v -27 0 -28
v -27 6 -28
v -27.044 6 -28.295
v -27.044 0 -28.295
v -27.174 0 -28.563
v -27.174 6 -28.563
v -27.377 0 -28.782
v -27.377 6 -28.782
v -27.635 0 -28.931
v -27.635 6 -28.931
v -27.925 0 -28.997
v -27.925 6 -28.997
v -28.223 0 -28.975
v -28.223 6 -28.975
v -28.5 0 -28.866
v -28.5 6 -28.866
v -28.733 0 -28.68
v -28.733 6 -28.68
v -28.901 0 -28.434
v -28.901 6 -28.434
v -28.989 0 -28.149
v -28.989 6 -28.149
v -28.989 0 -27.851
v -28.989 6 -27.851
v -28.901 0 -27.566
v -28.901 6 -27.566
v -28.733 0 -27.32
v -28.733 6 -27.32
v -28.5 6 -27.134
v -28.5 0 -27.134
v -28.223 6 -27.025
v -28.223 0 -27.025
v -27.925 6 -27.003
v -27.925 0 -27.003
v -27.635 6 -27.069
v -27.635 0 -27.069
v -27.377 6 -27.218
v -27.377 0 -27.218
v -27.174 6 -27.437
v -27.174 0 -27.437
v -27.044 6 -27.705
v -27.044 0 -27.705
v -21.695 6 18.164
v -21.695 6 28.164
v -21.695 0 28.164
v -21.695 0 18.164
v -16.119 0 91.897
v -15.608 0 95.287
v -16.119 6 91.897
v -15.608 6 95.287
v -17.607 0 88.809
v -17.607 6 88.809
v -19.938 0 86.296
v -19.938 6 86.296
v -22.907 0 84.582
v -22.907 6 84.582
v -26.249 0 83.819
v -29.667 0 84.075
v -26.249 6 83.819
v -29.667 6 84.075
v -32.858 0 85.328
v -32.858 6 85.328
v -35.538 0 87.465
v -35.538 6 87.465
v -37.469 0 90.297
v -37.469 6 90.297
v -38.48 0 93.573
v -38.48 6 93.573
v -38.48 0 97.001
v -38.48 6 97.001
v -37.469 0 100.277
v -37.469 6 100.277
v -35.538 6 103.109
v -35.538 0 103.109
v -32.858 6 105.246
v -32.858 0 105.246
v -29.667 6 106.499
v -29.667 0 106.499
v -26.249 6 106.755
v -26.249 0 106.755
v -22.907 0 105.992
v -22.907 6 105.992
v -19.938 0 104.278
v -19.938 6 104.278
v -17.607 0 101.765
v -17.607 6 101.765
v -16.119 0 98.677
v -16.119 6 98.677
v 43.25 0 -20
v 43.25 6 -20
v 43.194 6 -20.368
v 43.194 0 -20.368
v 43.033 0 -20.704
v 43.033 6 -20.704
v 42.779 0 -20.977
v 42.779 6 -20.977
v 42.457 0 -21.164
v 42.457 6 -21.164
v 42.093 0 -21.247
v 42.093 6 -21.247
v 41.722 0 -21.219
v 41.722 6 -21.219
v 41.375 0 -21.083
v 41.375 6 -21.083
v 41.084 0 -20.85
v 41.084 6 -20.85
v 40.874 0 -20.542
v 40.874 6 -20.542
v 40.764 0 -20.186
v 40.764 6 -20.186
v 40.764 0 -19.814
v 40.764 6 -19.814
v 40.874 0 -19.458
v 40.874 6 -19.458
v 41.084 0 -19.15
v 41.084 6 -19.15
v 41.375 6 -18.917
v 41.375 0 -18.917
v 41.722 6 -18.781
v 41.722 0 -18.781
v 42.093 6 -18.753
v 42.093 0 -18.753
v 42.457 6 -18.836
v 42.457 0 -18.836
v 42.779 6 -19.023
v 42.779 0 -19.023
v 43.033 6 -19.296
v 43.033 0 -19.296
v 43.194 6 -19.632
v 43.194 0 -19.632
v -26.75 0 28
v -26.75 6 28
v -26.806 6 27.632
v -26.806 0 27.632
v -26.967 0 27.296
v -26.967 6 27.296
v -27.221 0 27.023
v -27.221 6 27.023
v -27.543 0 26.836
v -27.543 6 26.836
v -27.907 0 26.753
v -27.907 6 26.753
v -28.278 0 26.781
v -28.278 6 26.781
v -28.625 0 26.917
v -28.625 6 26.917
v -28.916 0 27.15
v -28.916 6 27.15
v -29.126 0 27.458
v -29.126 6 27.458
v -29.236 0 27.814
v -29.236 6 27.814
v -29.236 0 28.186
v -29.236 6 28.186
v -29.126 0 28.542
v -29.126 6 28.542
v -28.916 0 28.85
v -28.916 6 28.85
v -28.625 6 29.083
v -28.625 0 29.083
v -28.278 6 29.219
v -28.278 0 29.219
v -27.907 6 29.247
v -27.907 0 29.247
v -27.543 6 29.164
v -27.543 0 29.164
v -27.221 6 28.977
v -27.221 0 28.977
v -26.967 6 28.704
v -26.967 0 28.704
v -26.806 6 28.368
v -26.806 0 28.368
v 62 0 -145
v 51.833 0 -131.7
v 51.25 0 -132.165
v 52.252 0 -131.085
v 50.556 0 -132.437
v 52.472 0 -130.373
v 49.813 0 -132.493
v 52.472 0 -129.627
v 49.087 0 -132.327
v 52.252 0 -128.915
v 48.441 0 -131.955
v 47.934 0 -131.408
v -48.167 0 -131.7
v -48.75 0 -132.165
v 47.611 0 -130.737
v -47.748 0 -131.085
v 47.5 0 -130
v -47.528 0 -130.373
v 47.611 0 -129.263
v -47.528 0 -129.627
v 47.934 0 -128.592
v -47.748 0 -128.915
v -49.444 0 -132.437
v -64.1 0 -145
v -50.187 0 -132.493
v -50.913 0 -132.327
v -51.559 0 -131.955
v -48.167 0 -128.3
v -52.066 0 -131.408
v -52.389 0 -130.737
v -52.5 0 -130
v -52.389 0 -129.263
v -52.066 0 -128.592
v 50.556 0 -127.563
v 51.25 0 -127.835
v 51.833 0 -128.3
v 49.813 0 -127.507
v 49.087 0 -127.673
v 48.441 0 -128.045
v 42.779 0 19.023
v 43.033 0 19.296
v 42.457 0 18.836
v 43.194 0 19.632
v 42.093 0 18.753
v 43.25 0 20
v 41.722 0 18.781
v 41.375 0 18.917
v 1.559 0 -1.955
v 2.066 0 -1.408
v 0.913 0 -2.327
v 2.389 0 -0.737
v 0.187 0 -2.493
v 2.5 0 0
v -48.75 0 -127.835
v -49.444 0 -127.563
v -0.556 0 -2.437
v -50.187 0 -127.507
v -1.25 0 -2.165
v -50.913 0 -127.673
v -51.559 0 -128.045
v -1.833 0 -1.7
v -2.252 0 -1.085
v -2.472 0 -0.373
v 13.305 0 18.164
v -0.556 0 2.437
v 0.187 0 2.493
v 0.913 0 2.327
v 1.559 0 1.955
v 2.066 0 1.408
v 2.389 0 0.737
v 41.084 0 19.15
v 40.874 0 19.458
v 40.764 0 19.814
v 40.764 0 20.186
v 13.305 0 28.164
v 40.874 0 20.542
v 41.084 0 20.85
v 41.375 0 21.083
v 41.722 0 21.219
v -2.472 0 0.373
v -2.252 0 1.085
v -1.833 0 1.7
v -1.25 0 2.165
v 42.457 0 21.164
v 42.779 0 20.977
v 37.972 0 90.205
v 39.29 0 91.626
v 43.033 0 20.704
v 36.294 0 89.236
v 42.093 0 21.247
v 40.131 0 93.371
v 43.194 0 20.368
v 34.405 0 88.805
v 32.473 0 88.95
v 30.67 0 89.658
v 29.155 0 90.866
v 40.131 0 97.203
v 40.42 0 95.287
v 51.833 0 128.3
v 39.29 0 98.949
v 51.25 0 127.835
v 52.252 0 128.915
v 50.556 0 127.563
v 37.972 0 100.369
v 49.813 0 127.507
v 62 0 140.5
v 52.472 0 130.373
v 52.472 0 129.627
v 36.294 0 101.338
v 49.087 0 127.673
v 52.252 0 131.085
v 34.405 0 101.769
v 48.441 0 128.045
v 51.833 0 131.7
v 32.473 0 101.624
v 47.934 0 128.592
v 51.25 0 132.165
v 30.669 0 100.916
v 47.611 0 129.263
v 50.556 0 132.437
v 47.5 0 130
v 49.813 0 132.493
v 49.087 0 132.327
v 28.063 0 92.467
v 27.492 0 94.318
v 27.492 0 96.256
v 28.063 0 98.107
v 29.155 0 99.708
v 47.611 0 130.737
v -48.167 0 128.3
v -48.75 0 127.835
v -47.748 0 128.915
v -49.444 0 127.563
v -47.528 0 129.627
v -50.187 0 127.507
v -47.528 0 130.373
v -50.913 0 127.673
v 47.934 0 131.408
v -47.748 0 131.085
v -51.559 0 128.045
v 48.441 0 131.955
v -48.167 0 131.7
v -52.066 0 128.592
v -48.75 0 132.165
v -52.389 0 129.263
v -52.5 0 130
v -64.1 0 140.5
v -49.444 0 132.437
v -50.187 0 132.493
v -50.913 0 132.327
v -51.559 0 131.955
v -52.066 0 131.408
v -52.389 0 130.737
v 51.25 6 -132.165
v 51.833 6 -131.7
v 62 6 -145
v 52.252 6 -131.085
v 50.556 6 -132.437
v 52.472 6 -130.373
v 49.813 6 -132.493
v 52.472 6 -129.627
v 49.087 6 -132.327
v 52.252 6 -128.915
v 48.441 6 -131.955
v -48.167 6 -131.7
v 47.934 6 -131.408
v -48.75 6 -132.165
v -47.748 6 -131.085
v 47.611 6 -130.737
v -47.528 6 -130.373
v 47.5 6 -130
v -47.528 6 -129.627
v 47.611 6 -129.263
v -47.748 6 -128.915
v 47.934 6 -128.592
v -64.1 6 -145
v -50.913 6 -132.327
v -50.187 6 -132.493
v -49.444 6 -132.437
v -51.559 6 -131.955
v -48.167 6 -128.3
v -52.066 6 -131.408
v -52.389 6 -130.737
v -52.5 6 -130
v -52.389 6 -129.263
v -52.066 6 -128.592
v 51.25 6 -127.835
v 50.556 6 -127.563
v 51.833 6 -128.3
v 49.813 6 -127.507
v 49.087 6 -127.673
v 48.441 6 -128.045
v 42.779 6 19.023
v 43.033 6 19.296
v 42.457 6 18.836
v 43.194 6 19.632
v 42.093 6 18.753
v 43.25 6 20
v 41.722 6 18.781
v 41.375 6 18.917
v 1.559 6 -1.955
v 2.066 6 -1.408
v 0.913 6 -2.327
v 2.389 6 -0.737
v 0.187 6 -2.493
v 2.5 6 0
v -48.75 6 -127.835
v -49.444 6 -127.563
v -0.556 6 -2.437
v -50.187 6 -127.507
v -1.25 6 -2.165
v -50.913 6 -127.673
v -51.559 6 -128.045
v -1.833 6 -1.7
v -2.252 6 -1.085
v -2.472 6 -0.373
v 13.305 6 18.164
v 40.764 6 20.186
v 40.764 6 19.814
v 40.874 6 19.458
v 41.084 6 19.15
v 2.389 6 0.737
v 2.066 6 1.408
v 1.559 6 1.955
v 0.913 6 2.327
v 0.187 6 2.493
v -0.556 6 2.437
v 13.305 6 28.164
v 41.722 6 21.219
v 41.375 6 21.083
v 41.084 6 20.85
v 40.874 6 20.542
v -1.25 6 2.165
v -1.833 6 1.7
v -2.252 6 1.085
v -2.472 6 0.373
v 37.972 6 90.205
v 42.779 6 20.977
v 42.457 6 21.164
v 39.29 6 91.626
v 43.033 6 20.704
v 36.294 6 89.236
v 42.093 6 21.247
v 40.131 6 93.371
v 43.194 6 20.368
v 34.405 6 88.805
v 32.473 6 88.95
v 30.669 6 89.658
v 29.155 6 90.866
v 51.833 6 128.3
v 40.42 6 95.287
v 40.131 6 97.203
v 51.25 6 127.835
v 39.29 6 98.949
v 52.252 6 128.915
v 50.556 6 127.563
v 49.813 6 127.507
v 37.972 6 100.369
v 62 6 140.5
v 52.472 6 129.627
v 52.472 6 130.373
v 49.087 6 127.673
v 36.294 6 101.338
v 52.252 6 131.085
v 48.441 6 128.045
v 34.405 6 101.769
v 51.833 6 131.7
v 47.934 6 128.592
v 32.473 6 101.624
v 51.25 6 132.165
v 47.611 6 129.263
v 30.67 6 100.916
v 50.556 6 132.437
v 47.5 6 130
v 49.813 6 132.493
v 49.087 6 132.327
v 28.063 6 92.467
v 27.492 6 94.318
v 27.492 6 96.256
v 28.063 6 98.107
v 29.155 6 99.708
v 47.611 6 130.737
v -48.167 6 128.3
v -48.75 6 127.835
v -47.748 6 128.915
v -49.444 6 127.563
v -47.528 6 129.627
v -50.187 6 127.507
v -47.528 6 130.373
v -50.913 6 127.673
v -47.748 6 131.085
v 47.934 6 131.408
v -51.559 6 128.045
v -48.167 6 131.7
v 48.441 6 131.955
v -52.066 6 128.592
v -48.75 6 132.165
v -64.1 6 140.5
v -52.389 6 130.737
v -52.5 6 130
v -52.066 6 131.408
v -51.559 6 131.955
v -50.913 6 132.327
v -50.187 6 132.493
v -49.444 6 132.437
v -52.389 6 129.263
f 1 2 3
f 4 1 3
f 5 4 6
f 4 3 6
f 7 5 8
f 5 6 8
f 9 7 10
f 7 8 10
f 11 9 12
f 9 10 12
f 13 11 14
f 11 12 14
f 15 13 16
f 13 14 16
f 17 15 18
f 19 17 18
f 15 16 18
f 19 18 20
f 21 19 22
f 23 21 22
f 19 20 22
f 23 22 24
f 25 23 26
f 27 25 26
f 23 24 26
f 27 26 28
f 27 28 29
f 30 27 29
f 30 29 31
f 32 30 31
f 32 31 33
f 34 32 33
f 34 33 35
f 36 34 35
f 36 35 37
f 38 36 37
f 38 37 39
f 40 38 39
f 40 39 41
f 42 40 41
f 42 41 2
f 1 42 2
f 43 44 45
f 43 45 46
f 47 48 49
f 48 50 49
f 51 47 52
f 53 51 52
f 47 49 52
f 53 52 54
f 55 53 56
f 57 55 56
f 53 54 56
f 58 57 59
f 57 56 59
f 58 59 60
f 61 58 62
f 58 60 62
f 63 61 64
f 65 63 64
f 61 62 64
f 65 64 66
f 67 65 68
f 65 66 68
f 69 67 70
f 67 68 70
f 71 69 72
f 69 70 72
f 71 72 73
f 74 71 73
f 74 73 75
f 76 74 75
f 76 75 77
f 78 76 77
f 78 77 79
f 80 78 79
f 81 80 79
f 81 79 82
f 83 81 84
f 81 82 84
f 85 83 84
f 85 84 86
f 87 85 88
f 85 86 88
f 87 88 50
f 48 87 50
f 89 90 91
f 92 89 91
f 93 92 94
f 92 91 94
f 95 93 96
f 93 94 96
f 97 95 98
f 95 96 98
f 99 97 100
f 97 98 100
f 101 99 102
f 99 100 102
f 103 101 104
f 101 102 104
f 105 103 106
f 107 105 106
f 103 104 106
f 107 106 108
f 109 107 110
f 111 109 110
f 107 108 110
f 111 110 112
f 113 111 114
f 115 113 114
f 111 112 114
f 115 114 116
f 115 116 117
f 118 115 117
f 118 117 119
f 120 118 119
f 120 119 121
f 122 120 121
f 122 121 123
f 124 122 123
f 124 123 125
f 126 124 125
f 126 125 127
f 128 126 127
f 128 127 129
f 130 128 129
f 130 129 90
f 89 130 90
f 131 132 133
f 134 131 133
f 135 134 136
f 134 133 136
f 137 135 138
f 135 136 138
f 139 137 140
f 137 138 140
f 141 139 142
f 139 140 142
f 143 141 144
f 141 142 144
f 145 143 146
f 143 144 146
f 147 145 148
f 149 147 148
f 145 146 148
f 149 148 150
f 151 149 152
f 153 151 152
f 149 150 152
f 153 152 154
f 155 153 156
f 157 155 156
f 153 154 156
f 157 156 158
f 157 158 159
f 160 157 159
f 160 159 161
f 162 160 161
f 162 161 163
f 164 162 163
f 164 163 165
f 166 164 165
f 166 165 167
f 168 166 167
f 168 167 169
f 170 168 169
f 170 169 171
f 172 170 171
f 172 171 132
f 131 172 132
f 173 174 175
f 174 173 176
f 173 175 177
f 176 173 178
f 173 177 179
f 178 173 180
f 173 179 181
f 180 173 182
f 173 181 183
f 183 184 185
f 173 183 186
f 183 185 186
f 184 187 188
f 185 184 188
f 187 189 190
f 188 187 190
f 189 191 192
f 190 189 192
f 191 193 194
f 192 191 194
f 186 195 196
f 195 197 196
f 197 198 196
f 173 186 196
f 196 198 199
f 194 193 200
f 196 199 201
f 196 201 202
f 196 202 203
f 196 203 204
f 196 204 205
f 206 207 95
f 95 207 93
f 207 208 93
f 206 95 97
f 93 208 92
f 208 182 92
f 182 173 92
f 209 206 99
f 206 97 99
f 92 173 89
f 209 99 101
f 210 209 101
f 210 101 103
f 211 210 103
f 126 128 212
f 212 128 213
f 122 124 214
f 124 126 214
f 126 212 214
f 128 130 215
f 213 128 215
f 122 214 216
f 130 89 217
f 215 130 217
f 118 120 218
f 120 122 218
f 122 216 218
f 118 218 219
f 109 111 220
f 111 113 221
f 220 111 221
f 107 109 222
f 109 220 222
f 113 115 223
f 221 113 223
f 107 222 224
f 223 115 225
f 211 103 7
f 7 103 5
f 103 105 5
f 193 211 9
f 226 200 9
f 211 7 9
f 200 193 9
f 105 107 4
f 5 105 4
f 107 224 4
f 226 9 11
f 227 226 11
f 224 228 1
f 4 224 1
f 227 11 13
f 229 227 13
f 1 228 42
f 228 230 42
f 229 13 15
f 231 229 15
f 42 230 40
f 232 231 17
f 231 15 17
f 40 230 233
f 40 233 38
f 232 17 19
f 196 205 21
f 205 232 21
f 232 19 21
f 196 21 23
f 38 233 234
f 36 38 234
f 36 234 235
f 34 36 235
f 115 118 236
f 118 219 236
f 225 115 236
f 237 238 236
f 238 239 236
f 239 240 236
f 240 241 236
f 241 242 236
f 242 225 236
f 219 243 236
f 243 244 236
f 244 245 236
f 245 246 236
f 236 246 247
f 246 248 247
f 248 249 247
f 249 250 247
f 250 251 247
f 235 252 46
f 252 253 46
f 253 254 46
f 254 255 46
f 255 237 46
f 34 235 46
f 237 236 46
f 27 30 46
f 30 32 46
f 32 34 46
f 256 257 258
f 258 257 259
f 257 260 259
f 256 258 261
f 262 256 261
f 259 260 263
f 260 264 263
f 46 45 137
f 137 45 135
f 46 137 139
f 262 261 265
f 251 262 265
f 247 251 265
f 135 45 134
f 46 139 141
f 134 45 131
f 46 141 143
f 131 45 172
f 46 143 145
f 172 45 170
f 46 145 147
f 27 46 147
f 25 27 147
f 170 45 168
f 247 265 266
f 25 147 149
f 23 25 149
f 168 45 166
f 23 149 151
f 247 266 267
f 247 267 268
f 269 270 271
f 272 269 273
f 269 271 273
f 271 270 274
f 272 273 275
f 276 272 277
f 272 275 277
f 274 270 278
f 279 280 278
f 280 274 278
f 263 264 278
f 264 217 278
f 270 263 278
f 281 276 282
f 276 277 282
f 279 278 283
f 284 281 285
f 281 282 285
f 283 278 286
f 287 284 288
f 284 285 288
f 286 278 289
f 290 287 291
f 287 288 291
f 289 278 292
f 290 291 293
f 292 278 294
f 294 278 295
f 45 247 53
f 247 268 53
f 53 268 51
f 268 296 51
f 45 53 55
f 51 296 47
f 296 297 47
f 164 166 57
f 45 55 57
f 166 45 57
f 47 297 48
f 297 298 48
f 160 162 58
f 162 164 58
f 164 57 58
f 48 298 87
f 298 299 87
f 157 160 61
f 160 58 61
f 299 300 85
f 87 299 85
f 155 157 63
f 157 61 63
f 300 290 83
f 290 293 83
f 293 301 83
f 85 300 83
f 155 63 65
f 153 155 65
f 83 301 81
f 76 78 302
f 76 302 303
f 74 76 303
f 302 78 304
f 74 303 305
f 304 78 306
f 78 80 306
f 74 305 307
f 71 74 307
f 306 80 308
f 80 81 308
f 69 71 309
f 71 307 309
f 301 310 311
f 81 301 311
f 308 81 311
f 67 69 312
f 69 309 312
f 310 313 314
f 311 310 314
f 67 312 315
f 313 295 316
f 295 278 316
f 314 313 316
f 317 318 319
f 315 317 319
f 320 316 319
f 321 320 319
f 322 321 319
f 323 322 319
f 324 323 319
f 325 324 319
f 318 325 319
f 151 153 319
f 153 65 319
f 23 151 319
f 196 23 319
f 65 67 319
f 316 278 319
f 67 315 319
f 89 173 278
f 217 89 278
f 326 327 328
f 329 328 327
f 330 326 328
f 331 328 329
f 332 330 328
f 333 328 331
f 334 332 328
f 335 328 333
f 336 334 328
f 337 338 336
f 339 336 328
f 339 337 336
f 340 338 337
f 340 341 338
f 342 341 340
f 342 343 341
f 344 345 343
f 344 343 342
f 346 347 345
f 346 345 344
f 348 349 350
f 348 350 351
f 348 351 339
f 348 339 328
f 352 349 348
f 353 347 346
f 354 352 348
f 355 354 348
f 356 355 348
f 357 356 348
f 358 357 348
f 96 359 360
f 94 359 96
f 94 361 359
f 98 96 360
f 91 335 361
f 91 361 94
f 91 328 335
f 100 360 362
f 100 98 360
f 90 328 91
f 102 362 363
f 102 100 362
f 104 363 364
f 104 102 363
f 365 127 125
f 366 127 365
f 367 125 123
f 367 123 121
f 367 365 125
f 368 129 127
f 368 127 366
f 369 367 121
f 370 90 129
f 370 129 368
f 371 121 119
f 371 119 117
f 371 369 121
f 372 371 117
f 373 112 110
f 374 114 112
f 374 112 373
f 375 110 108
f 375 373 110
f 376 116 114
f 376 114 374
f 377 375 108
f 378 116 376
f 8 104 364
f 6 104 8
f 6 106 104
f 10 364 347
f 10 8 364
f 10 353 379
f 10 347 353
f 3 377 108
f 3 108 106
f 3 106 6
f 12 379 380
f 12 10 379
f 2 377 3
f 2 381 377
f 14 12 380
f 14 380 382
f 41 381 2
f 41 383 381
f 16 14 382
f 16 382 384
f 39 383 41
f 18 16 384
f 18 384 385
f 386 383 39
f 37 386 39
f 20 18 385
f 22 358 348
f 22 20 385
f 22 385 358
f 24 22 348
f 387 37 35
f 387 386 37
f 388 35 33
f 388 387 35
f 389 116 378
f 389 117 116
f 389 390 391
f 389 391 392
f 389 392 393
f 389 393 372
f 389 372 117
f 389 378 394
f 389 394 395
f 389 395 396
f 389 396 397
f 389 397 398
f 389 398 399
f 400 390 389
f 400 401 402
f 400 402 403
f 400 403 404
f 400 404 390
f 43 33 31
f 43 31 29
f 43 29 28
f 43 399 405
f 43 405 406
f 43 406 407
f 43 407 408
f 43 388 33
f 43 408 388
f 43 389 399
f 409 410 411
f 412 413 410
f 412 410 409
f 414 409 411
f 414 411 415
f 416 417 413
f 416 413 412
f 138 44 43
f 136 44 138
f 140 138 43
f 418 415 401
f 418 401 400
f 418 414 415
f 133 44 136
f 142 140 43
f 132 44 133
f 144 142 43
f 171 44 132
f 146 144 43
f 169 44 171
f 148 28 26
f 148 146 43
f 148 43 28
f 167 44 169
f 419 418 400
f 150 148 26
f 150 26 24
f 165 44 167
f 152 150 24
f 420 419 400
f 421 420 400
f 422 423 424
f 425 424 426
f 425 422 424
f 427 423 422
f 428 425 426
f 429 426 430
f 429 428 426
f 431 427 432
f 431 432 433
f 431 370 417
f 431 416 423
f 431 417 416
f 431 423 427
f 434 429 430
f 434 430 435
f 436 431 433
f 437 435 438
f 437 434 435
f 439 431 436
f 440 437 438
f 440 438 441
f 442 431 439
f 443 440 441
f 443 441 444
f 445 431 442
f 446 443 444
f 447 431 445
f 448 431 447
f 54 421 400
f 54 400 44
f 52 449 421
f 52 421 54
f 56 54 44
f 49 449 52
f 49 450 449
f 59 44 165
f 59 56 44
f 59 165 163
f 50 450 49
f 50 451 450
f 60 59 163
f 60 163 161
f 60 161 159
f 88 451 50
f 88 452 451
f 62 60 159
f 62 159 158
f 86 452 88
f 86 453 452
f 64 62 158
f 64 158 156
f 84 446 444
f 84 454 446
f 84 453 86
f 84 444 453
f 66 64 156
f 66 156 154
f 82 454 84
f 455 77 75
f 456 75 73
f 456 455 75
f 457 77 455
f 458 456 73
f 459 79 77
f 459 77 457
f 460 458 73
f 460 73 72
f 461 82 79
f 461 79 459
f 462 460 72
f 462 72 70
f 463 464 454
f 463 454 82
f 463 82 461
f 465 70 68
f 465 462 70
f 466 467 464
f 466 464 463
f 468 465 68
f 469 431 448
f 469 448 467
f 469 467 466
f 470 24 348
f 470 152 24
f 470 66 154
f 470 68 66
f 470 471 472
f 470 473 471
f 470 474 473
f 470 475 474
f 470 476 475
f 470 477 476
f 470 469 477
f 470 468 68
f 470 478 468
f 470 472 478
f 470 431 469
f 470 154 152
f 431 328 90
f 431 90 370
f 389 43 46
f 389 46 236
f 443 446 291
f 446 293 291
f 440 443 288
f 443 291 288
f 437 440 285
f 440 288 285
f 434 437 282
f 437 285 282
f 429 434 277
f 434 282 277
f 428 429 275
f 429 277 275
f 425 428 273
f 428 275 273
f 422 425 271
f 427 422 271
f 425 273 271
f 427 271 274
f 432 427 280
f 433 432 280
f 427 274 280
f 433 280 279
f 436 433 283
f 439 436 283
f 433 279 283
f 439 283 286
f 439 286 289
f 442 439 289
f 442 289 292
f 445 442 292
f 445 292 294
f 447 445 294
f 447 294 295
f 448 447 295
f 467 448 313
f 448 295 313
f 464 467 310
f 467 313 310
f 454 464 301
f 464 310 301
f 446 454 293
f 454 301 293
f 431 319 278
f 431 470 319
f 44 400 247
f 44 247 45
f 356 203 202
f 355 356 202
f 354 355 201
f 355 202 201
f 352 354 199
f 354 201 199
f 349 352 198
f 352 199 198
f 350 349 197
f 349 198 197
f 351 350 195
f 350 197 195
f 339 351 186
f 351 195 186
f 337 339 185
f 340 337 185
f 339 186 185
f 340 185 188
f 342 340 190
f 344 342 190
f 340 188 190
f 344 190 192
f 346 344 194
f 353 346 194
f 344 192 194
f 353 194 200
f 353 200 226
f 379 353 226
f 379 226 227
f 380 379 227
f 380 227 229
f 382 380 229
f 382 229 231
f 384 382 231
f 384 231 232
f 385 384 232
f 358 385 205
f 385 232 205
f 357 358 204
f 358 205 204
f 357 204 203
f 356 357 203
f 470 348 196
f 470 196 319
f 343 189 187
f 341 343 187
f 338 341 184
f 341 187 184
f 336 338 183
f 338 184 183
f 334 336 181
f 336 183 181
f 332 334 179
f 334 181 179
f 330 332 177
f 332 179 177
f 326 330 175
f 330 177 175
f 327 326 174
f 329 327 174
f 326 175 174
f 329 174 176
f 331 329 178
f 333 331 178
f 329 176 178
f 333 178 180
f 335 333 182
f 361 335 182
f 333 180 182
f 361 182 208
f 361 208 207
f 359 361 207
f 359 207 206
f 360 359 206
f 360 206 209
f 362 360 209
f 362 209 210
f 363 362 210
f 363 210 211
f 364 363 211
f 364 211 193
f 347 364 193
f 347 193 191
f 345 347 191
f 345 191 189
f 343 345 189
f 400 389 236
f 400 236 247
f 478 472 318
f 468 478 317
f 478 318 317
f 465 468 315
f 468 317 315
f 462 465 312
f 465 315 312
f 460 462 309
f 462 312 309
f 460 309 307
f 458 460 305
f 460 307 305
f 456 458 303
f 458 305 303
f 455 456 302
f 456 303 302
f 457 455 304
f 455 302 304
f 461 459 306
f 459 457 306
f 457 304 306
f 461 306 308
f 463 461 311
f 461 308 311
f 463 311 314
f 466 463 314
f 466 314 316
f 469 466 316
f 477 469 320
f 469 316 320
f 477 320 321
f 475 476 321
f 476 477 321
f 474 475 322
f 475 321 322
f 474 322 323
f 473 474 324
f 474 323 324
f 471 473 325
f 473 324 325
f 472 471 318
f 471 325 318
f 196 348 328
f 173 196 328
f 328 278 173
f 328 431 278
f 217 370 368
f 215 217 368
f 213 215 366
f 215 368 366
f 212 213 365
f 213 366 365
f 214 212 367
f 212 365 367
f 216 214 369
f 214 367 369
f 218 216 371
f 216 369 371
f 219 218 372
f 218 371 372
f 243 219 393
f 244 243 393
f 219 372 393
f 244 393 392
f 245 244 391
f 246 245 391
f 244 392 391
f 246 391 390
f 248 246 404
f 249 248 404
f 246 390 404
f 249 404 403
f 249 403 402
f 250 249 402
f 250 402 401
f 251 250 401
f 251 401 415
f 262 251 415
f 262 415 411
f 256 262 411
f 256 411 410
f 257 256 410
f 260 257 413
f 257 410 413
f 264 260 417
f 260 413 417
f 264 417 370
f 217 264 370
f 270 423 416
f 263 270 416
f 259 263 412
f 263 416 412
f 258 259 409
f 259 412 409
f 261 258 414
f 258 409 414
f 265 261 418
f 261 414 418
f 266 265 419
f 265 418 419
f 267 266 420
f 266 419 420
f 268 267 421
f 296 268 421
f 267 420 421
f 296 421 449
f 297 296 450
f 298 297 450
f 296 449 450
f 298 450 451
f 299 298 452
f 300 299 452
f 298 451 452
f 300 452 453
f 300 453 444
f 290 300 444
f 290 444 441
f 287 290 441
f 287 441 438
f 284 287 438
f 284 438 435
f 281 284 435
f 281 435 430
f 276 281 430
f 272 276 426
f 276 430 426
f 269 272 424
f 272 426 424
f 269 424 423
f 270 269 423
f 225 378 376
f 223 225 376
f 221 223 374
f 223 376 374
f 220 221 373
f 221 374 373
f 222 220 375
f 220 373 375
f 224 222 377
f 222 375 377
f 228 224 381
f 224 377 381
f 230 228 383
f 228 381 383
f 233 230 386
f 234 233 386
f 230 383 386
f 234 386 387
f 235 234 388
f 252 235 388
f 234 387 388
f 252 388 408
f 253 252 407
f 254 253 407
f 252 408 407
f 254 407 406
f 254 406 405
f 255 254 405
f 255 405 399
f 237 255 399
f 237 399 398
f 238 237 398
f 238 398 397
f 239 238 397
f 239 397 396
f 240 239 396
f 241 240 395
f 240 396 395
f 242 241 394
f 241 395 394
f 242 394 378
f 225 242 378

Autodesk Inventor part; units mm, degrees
ref_plane "YZ Plane" through (0, 0, 0) normal (1, 0, 0) x (0, 1, 0)
ref_plane "XZ Plane" through (0, 0, 0) normal (0, 1, 0) x (-1, 0, 0)
ref_plane "XY Plane" through (0, 0, 0) normal (0, 0, 1) x (1, 0, 0)
sketch "Sketch1" plane through (0, 0, 0) normal (0, 1, 0) x (-1, 0, 0)
  line L0 (50, 130) -> (-50, 130)
  line L1 (-50, 130) -> (-50, -130)
  line L2 (-50, -130) -> (50, -130)
  line L3 (50, -130) -> (50, 130)
  line L4 (50, 130) -> (-50, -130) construction
  line L5 (-50, 130) -> (50, -130) construction
  line L6 (57.5, 137.5) -> (-57.5, 137.5)
  line L7 (-57.5, 137.5) -> (-57.5, -137.5)
  line L8 (-57.5, -137.5) -> (57.5, -137.5)
  line L9 (57.5, -137.5) -> (57.5, 137.5)
  line L10 (57.5, 137.5) -> (-57.5, -137.5) construction
  line L11 (-57.5, 137.5) -> (57.5, -137.5) construction
  circle A0 centre (50, 130) radius 2.5
  circle A1 centre (-50, 130) radius 2.5
  circle A2 centre (-50, -130) radius 2.5
  circle A3 centre (50, -130) radius 2.5
  point P0 (0, 0)
  dimension "d0" = 100
  dimension "d1" = 260
  dimension "d2" = 115
  dimension "d3" = 275
  dimension "d4" = 5
  dimension "d5" = 5
  dimension "d6" = 5
  dimension "d7" = 5
extrude "Extrusion1" add sketch "Sketch1" along normal blind 6 contours L0 A0 L3 A3 L2 A2 L1 A1 | L9 L8 L7 L6
sketch "Sketch2" plane through (0, 6, 0) normal (0, 1, 0) x (1, 0, 0)
  circle A0 centre (0, 0) radius 2.5
  line L0 (0, 0) -> (42, 0)
  line L1 (42, 0) -> (0, 0)
  line L2 (0, 0) -> (-28, 0)
  line L3 (-28, 0) -> (-28, 28)
  line L4 (-28, 28) -> (-28, -28)
  line L5 (42, 0) -> (42, 20)
  line L6 (42, 20) -> (42, -20)
  circle A1 centre (-28, -28) radius 1.25
  circle A2 centre (-28, 28) radius 1
  circle A3 centre (42, 20) radius 1.25
  circle A4 centre (42, -20) radius 1.25
  line L7 (-21.6952, -23.1643) -> (-21.6952, -28.1643)
  line L8 (-21.6952, -28.1643) -> (-21.6952, -23.1643)
  line L9 (-21.6952, -23.1643) -> (-21.6952, -18.1643)
  line L10 (-21.6952, -18.1643) -> (13.3048, -18.1643)
  line L11 (13.3048, -18.1643) -> (13.3048, -28.1643)
  line L12 (13.3048, -28.1643) -> (-21.6952, -28.1643)
  dimension "d10" = 5
  dimension "d11" = 42
  dimension "d12" = 42
  dimension "d13" = 28
  dimension "d14" = 28
  dimension "d15" = 56
  dimension "d16" = 20
  dimension "d17" = 40
  dimension "d18" = 2.5
  dimension "d19" = 2
  dimension "d20" = 2.5
  dimension "d21" = 2.5
  dimension "d22" = 5
  dimension "d23" = 5
  dimension "d24" = 5
  dimension "d25" = 35
extrude "Extrusion2" cut sketch "Sketch2" against normal blind 6
sketch "Sketch3" plane through (0, 6, 0) normal (0, 1, 0) x (1, 0, 0)
  point P0 (0, 0)
sketch "Sketch4" plane through (0, 6, 0) normal (0, 1, 0) x (1, 0, 0)
  line L0 (-57.5, 137.5) -> (-57.5, -137.5) projected
  line L1 (-57.5, -137.5) -> (-57.5, 0)
  line L2 (-21.6952, -18.1643) -> (-21.6952, -28.1643) projected
  line L3 (-21.6952, -28.1643) -> (-75.3295, -28.1643)
  line L4 (-75.3295, -28.1643) -> (-57.5, -28.1643)
  line L5 (-57.5, -137.5) -> (-57.5, -28.1643)
  line L6 (-57.5, -28.1643) -> (-57.5, -82.8322)
  line L7 (-57.5, -82.8322) -> (-27.1083, -82.8322)
  line L8 (-27.1083, -82.8322) -> (0, -82.8322)
  line L9 (0, -82.8322) -> (72.7953, -82.8322)
  line L10 (72.7953, -82.8322) -> (0, -82.8322)
  line L11 (0, -95.2871) -> (0, -82.8322)
  line L12 (0, -95.2871) -> (-27.1083, -95.2871)
  line L13 (-27.1083, -95.2871) -> (0, -95.2871)
  line L14 (33.9195, -95.2871) -> (0, -95.2871)
  circle A0 centre (-27.1083, -95.2871) radius 11.5
  circle A1 centre (33.9195, -95.2871) radius 6.5
  point P0 (0, 0)
  dimension "d28" = 23
  dimension "d29" = 13
extrude "Extrusion3" cut sketch "Sketch4" against normal blind 10
sketch "Sketch5" plane through (0, 6, 0) normal (0, 1, 0) x (1, 0, 0)
  line L0 (-57.5, -137.5) -> (57.5, -137.5) projected
  line L1 (-57.5, -137.5) -> (-64.1, -137.5)
  line L2 (57.5, 137.5) -> (-57.5, 137.5) projected
  line L3 (-57.5, 137.5) -> (-64.1, 137.5)
  line L4 (-64.1, 137.5) -> (-64.1, -137.5)
  line L5 (-64.1, 137.5) -> (-64.1, 145)
  line L6 (-64.1, 145) -> (57.5, 145)
  line L7 (57.5, 145) -> (57.5, 137.5)
  line L8 (57.5, 145) -> (62, 145)
  line L9 (62, 145) -> (62, -137.5)
  line L10 (57.5, -137.5) -> (57.5, 137.5) projected
  line L11 (62, -137.5) -> (57.5, -137.5)
  line L12 (-64.1, -137.5) -> (-64.1, -140.5)
  line L13 (-64.1, -140.5) -> (62, -140.5)
  line L14 (62, -140.5) -> (62, -137.5)
  line L15 (-57.5, -137.5) -> (-57.5, 137.5)
  line L16 (57.5, 137.5) -> (57.5, -137.5)
  point P0 (0, 0)
  dimension "d32" = 6.6
  dimension "d33" = 6.6
  dimension "d34" = 7.5
  dimension "d35" = 4.5
  dimension "d36" = 3
extrude "Extrusion4" add sketch "Sketch5" against normal blind 6 contours L0 L11 L14 L13 L12 L1 | L1 L4 L3 L15 | L10 L7 L8 L9 L11 | L3 L5 L6 L7 L2
properties part number "platform_plate" material "Acrylic"
